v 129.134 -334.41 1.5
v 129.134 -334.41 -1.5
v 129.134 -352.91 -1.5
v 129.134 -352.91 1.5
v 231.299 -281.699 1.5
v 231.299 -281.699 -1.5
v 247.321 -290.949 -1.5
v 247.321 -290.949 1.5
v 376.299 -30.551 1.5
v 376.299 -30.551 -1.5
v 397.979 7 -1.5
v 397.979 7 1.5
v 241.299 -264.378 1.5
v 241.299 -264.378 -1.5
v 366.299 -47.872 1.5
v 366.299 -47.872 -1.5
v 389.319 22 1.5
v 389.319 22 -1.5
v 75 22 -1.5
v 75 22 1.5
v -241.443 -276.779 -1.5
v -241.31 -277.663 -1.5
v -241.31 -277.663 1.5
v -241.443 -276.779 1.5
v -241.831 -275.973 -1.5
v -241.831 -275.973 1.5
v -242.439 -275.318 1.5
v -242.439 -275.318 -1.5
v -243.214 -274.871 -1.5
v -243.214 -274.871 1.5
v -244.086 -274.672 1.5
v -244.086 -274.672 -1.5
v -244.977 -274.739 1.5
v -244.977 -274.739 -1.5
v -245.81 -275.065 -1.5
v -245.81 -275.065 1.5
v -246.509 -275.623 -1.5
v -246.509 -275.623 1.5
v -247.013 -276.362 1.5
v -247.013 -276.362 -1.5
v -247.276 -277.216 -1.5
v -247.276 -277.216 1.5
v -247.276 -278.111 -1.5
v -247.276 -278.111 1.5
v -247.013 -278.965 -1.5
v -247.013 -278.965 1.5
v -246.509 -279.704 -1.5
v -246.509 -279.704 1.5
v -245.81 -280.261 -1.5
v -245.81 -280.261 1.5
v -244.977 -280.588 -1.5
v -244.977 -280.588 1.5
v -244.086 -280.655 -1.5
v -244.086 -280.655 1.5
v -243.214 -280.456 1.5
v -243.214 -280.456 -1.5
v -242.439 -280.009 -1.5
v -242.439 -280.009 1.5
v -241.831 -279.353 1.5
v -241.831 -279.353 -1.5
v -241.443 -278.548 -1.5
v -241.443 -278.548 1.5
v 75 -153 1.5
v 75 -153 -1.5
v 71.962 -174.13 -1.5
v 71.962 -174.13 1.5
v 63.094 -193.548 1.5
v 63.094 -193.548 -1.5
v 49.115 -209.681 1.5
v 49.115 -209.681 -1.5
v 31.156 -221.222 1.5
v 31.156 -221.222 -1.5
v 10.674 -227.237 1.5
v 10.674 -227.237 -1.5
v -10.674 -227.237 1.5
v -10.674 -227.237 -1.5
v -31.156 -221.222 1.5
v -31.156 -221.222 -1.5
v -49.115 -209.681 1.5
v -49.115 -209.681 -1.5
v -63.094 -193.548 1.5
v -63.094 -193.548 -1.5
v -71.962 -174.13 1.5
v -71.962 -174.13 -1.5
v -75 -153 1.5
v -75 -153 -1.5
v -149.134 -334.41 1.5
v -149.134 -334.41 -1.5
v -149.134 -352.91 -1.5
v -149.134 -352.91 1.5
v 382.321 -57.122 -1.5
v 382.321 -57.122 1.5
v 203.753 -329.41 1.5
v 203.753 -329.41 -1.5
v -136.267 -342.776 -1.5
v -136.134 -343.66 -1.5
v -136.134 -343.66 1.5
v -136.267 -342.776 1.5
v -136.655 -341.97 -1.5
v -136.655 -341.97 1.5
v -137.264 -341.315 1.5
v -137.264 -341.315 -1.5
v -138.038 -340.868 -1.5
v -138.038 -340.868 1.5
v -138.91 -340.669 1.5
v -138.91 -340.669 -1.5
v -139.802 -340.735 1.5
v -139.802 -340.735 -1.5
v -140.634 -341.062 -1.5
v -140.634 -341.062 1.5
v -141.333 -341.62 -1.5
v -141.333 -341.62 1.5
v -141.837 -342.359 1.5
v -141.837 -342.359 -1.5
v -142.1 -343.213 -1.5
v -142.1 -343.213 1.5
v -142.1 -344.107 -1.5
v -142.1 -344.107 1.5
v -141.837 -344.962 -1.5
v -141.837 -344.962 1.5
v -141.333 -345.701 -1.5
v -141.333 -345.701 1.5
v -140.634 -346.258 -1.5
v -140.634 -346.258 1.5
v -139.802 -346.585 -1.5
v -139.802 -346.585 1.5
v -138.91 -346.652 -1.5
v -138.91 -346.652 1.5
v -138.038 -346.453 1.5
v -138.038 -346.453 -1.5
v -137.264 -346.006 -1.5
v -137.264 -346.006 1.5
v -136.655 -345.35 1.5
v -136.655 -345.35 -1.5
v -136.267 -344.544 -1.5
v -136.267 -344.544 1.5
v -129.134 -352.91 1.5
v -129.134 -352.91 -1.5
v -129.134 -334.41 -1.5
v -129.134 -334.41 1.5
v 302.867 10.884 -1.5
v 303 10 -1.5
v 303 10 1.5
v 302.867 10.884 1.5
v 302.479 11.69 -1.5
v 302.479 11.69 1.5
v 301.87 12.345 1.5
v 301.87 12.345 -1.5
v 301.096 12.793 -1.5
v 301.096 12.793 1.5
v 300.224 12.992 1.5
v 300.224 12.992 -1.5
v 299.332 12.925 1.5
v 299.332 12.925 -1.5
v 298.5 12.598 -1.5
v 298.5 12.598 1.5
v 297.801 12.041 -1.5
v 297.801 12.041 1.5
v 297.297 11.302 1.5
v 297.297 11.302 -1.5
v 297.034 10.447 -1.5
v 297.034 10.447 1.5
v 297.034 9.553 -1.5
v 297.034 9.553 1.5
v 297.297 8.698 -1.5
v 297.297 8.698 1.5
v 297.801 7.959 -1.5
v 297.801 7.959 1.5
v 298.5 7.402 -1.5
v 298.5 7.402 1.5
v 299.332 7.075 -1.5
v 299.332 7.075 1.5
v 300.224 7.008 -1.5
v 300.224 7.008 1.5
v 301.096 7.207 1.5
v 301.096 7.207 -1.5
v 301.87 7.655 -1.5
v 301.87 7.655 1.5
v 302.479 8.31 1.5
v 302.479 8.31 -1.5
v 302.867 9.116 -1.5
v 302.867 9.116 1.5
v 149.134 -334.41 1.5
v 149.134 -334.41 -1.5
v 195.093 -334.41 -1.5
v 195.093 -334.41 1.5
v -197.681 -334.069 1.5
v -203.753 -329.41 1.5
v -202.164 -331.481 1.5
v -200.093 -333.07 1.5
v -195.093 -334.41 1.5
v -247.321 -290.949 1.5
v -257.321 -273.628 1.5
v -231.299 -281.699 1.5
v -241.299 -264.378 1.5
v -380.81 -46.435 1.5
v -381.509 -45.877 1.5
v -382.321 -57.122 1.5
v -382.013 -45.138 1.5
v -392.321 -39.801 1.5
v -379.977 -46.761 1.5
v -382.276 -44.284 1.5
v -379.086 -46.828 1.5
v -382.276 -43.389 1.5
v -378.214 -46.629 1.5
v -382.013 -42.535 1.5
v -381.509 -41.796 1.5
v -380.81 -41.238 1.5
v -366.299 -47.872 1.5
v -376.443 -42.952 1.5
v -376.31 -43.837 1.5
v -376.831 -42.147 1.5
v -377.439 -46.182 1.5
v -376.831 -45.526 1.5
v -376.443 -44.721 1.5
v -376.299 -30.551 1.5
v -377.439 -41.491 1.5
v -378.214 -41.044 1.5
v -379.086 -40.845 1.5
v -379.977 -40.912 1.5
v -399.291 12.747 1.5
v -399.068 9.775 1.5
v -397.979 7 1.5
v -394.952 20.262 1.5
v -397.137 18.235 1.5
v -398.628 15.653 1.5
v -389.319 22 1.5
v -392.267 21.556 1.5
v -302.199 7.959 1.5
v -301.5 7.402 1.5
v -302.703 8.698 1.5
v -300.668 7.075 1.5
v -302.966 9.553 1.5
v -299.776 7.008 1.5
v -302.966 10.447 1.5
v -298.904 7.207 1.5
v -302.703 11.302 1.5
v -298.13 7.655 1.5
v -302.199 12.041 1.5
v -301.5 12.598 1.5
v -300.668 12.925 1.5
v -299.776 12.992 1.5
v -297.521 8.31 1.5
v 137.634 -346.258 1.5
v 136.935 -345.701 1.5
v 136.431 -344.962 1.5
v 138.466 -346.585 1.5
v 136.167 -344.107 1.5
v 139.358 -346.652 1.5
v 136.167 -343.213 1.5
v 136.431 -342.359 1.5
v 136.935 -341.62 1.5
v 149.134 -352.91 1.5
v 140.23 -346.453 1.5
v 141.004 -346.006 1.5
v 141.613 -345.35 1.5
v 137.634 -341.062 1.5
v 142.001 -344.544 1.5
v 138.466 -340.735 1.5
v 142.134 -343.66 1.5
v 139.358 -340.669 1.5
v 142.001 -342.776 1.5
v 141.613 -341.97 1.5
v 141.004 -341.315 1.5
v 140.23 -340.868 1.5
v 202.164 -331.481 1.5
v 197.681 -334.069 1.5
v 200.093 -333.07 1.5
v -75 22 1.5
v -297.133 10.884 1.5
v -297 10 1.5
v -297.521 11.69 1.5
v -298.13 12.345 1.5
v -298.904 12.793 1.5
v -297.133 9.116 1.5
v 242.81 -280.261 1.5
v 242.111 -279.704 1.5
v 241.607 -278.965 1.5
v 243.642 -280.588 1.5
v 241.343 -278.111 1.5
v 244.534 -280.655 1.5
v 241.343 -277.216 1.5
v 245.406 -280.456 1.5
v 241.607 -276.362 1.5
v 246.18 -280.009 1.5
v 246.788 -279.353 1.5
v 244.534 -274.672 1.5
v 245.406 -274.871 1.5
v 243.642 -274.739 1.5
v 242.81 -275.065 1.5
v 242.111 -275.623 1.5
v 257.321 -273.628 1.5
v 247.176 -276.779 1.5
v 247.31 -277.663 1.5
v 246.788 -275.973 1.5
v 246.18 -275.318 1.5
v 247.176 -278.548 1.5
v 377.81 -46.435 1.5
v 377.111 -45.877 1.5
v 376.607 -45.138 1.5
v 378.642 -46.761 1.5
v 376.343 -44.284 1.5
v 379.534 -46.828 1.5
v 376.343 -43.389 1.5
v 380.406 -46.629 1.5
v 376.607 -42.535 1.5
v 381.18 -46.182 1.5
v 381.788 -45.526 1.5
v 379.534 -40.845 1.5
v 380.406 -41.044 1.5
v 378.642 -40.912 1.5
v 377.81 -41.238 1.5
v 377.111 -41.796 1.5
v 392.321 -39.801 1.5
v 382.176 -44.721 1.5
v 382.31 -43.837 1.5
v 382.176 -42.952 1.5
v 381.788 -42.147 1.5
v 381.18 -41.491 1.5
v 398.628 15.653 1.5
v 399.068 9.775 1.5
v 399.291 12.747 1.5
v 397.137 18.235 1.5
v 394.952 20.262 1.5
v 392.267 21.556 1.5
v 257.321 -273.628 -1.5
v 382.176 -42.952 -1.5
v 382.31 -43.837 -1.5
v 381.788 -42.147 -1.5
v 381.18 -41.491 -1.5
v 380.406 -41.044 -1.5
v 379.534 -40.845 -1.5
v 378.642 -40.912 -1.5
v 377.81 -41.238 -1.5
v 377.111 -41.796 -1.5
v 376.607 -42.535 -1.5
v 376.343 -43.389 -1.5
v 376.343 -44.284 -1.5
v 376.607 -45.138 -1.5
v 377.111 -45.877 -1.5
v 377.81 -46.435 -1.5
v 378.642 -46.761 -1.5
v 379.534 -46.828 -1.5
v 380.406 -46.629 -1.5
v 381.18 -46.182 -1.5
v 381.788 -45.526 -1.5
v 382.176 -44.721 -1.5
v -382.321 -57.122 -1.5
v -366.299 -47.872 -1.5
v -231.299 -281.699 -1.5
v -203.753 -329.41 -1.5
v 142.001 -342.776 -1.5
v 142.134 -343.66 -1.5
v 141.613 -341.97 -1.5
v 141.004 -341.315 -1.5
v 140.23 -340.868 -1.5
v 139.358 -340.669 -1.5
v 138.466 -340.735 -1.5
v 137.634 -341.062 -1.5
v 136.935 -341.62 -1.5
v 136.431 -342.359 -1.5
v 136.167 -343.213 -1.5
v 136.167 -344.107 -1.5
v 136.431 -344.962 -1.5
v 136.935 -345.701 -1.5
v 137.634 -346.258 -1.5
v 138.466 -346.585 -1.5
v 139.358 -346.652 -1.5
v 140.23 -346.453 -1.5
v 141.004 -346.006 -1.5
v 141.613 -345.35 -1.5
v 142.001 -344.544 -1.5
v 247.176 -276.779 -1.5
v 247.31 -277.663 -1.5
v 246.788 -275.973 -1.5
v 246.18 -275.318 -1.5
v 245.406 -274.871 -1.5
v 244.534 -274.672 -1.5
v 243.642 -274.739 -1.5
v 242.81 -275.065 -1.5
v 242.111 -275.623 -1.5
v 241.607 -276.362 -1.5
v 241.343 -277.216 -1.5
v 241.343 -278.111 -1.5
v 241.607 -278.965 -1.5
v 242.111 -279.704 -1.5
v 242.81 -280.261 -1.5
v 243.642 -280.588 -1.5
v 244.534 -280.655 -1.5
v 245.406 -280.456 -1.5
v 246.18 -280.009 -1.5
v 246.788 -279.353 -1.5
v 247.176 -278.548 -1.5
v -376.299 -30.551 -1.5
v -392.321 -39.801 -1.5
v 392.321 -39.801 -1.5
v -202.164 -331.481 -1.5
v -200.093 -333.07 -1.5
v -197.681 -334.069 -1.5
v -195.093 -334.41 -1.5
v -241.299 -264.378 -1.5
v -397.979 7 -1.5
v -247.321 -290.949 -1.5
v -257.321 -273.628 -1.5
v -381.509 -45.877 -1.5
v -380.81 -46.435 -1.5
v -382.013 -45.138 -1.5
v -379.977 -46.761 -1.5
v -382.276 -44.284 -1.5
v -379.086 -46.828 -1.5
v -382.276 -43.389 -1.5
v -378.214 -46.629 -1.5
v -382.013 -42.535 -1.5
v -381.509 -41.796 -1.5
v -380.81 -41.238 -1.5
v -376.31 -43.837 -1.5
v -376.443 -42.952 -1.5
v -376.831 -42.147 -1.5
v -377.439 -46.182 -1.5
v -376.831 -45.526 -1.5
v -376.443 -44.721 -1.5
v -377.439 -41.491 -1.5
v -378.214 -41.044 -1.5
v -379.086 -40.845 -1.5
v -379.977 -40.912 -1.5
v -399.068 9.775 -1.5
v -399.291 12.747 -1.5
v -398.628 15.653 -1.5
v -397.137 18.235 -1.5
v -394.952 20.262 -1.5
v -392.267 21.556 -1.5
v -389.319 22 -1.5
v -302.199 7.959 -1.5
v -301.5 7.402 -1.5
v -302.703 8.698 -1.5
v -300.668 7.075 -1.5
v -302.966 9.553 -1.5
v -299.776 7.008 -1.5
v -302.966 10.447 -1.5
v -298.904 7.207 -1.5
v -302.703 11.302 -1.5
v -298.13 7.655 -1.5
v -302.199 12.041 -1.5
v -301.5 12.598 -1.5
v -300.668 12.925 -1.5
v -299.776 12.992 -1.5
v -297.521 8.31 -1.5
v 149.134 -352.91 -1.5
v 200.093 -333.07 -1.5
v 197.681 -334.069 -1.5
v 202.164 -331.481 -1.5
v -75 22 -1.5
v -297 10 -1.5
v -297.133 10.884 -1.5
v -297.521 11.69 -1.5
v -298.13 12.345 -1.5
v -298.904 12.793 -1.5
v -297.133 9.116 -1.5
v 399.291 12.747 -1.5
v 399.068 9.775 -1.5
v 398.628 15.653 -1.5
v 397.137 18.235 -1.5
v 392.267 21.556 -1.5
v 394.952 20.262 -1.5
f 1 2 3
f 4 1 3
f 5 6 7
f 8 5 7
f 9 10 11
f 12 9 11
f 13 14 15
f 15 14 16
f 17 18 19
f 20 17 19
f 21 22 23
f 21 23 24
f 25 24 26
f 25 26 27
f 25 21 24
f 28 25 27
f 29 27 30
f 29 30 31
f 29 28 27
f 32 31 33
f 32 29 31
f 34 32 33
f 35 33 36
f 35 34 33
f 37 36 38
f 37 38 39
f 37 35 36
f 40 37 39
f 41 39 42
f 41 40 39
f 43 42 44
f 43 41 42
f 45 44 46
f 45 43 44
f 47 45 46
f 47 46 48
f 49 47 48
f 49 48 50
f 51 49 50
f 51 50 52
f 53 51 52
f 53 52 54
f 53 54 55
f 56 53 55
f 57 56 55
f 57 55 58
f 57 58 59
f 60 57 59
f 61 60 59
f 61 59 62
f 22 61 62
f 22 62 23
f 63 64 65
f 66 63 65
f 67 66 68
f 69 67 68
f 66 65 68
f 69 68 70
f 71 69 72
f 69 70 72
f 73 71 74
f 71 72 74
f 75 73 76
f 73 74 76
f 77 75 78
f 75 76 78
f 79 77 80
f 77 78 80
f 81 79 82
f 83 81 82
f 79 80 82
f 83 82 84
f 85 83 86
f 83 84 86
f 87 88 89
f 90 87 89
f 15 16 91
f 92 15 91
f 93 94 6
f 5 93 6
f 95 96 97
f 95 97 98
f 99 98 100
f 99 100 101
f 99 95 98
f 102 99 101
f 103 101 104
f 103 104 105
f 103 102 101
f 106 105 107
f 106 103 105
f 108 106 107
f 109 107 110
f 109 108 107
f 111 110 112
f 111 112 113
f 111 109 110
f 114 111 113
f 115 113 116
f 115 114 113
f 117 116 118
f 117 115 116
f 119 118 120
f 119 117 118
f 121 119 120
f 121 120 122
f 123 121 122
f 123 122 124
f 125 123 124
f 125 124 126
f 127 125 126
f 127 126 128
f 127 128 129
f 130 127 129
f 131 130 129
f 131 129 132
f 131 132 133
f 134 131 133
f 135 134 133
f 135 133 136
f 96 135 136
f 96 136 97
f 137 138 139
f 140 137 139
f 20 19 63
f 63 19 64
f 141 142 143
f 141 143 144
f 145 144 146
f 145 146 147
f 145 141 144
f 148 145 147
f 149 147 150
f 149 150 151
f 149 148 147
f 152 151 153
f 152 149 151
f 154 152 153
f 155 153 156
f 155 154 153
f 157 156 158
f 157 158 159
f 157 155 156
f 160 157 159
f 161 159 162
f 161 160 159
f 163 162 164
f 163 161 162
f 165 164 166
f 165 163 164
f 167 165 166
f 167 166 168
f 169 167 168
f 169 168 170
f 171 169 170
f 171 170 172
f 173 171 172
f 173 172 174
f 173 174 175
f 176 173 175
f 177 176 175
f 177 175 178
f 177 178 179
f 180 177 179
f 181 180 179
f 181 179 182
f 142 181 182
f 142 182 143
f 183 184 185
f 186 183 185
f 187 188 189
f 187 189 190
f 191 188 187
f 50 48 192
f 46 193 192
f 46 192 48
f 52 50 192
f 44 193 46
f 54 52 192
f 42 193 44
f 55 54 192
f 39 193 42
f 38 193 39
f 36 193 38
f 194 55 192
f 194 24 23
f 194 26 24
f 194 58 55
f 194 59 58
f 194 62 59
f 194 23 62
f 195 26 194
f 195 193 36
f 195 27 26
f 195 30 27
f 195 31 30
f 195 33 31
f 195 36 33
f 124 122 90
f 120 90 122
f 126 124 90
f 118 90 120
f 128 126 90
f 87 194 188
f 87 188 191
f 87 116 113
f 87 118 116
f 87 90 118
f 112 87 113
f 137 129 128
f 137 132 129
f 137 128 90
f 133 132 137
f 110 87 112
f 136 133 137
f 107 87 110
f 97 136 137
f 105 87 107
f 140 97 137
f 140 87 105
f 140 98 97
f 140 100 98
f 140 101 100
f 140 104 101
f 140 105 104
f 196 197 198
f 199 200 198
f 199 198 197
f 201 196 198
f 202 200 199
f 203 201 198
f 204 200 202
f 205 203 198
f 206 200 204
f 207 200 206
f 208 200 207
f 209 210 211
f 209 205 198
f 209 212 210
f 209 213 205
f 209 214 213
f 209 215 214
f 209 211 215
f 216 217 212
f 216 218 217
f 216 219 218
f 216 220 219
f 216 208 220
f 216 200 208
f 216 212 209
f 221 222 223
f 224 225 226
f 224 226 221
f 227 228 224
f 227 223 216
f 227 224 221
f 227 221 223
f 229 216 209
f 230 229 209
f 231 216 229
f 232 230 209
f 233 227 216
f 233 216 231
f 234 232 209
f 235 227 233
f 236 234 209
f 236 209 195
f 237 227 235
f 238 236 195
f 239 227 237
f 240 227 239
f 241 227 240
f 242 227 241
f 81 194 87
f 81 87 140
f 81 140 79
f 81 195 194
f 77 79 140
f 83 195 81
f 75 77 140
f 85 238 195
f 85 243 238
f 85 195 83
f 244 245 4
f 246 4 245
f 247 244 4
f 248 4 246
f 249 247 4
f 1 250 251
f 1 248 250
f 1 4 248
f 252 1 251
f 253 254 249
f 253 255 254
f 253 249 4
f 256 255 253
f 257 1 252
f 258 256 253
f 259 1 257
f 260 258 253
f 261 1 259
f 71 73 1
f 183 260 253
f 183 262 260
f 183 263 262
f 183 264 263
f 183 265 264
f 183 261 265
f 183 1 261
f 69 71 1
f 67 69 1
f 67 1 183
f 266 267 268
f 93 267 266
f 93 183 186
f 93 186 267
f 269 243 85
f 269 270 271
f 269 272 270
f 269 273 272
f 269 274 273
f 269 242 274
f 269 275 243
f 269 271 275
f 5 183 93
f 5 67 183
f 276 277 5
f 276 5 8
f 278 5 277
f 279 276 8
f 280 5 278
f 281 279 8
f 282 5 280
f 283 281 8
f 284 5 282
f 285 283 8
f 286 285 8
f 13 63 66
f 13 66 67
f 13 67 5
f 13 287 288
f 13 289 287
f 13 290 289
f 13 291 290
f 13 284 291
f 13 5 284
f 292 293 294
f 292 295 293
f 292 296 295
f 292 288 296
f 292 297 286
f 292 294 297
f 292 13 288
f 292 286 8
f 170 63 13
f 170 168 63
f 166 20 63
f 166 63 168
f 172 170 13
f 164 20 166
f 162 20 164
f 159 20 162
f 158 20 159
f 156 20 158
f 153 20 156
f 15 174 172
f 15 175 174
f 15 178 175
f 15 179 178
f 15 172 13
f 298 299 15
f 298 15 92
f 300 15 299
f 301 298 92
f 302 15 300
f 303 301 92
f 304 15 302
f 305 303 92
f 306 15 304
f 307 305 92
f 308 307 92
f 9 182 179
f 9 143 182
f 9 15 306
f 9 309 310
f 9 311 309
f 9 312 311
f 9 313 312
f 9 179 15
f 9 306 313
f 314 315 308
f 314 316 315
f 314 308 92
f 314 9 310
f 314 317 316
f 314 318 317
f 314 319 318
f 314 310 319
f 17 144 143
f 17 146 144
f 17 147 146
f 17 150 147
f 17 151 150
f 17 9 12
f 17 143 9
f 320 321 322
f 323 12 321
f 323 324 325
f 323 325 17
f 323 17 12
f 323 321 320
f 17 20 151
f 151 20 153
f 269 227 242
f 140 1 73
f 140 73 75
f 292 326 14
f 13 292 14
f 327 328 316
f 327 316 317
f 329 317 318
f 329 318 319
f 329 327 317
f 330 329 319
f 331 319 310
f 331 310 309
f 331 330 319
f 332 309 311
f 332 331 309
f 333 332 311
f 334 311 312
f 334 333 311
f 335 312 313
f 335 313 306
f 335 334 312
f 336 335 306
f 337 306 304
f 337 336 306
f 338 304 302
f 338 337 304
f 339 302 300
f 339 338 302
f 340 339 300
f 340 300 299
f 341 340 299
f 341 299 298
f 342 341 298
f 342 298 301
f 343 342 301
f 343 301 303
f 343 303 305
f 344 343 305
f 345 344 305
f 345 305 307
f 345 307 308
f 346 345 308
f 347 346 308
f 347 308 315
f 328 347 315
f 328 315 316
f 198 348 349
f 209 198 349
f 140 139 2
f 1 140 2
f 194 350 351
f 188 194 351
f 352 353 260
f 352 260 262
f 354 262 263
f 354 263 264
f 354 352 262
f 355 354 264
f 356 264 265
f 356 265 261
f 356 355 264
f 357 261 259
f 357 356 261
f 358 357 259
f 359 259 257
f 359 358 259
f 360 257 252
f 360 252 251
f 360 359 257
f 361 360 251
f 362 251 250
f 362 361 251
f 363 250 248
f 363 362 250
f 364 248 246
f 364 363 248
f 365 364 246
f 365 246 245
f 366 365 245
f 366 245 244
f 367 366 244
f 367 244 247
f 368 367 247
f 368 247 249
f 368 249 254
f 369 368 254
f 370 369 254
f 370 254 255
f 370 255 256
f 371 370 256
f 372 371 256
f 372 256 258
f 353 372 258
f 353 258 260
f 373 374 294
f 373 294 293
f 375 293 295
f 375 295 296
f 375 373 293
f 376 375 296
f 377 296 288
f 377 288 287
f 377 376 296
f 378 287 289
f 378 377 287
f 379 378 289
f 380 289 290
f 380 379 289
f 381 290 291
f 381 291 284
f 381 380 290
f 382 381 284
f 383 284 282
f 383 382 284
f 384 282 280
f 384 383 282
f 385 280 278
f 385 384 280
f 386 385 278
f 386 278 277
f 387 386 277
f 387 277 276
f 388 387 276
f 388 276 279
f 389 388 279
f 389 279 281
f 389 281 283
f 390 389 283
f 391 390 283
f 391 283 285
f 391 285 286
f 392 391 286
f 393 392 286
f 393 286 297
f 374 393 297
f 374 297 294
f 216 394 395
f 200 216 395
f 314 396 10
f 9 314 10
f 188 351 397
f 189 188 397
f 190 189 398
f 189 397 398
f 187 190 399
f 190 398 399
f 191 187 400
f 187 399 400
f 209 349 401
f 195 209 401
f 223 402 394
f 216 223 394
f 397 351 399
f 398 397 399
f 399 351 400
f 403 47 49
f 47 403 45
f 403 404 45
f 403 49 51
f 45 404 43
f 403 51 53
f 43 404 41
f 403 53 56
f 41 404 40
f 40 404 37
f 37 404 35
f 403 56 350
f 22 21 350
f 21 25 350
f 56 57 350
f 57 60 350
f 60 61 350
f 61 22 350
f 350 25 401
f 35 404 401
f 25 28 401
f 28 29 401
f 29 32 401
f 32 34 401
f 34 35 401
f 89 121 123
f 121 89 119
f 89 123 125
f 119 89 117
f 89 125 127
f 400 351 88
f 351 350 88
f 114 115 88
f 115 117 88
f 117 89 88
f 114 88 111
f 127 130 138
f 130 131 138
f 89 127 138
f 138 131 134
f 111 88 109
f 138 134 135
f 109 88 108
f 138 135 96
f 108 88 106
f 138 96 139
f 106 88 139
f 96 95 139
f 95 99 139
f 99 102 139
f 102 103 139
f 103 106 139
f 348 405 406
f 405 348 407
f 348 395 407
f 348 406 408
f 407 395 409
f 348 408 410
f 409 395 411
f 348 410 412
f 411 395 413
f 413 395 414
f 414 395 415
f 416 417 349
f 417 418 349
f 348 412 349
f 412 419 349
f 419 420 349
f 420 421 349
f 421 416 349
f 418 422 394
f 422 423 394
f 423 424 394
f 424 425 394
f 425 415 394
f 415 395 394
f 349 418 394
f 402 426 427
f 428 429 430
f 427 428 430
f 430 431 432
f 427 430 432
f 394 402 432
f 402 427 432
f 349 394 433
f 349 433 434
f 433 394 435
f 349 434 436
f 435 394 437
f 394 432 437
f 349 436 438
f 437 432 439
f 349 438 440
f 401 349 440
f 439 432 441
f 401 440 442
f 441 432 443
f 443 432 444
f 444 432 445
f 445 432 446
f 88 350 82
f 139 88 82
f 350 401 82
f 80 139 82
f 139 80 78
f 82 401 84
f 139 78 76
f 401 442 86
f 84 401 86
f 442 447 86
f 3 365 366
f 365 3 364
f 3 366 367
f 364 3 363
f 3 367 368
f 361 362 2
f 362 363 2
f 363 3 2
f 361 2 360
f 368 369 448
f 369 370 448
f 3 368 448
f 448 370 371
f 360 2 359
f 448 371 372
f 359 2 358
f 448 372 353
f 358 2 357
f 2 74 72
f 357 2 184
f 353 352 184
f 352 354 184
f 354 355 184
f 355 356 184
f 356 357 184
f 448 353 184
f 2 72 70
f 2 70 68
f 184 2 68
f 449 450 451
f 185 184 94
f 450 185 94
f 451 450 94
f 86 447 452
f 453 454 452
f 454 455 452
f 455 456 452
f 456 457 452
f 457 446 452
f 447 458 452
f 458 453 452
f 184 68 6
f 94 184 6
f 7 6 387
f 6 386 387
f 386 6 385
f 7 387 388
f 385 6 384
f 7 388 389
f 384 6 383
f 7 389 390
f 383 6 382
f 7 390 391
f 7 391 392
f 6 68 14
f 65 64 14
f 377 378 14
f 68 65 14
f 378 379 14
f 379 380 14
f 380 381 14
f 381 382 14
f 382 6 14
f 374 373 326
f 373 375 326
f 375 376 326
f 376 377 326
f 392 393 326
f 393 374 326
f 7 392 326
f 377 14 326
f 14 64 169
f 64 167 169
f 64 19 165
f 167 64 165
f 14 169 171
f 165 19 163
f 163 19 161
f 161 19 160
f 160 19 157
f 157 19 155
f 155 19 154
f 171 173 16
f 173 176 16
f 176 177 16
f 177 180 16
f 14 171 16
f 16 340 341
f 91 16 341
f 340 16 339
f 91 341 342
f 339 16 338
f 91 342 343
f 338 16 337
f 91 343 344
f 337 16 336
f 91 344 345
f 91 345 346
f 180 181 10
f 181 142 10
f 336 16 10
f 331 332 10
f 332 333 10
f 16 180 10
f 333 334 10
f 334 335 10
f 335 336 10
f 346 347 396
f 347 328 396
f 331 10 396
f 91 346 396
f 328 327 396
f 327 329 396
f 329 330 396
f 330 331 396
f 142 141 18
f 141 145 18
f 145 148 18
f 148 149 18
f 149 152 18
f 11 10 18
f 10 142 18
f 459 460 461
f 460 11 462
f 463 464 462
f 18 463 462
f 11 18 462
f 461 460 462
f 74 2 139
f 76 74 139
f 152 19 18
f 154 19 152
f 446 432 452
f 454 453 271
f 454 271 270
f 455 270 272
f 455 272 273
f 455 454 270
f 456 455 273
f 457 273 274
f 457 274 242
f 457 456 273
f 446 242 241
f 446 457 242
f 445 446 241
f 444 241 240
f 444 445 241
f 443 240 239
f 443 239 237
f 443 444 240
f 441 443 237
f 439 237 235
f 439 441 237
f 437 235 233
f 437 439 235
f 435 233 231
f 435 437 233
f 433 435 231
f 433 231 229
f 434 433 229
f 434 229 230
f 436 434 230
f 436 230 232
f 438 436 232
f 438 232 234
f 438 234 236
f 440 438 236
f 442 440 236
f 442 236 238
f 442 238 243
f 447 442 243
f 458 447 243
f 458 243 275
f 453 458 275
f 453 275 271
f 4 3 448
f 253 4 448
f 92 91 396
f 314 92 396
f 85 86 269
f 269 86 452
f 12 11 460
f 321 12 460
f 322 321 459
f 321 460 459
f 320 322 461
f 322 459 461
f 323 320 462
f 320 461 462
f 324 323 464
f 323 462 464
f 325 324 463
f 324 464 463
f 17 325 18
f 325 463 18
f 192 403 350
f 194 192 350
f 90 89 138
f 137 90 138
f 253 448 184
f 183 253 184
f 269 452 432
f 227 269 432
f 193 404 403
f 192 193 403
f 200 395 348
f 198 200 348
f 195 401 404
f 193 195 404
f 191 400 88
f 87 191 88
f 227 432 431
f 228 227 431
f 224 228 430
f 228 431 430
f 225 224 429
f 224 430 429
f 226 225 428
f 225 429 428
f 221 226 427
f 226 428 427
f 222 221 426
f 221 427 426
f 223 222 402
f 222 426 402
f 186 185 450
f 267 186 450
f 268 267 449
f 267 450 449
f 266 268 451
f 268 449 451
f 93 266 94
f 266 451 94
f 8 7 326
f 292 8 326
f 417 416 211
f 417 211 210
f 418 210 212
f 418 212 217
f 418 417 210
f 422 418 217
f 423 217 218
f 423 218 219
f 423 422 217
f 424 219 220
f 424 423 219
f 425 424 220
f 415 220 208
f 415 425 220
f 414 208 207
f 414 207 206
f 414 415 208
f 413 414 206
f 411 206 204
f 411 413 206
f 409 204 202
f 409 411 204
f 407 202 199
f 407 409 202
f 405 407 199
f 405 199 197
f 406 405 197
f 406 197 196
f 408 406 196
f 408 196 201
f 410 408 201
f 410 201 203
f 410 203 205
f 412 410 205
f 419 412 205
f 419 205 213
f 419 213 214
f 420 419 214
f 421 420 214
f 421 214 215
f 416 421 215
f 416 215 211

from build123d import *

# Parameters (mm, degrees)
SKETCH_1_R              = 3
EXTRUDE_1_DEPTH         = 1.5
SHEET_START             = -1.5
SHEET_METAL_1_OUTLINE_R = 3
SHEET_METAL_1_DEPTH     = 1.5


# Read off the part's stored shape, not the designer's step: Преобразовать-Твердое тело1
with BuildPart() as part:
    # Sketch 1 → Бобышка-Вытянуть1 (new body)
    with BuildSketch(Plane.XY):
        with BuildLine():
            Line((389.31902002, 22), (75, 22))
            Line((75, 22), (75, -153))
            ThreePointArc((75, -153), (0, -228), (-75, -153))
            Line((-75, -153), (-75, 22))
            Line((-75, 22), (-389.31902002, 22))
            ThreePointArc((-389.31902002, 22), (-397.979274058, 17), (-397.979274058, 7))
            Line((-397.979274058, 7), (-376.299038106, -30.551270189))
            Line((-376.299038106, -30.551270189), (-392.320508076, -39.801270189))
            Line((-392.320508076, -39.801270189), (-382.320508076, -57.121778265))
            Line((-382.320508076, -57.121778265), (-366.299038106, -47.871778265))
            Line((-366.299038106, -47.871778265), (-241.299038106, -264.378129211))
            Line((-241.299038106, -264.378129211), (-257.320508076, -273.628129211))
            Line((-257.320508076, -273.628129211), (-247.320508076, -290.948637287))
            Line((-247.320508076, -290.948637287), (-231.299038106, -281.698637287))
            Line((-231.299038106, -281.698637287), (-203.75277675, -329.410161514))
            ThreePointArc((-203.75277675, -329.410161514), (-200.092522712, -333.070415552), (-195.092522712, -334.410161514))
            Line((-195.092522712, -334.410161514), (-149.133974596, -334.410161514))
            Line((-149.133974596, -334.410161514), (-149.133974596, -352.910161514))
            Line((-149.133974596, -352.910161514), (-129.133974596, -352.910161514))
            Line((-129.133974596, -352.910161514), (-129.133974596, -334.410161514))
            Line((-129.133974596, -334.410161514), (129.133974596, -334.410161514))
            Line((129.133974596, -334.410161514), (129.133974596, -352.910161514))
            Line((129.133974596, -352.910161514), (149.133974596, -352.910161514))
            Line((149.133974596, -352.910161514), (149.133974596, -334.410161514))
            Line((149.133974596, -334.410161514), (195.092522712, -334.410161514))
            ThreePointArc((195.092522712, -334.410161514), (200.092522712, -333.070415552), (203.75277675, -329.410161514))
            Line((203.75277675, -329.410161514), (231.299038106, -281.698637287))
            Line((231.299038106, -281.698637287), (247.320508076, -290.948637287))
            Line((247.320508076, -290.948637287), (257.320508076, -273.628129211))
            Line((257.320508076, -273.628129211), (241.299038106, -264.378129211))
            Line((241.299038106, -264.378129211), (366.299038106, -47.871778265))
            Line((366.299038106, -47.871778265), (382.320508076, -57.121778265))
            Line((382.320508076, -57.121778265), (392.320508076, -39.801270189))
            Line((392.320508076, -39.801270189), (376.299038106, -30.551270189))
            Line((376.299038106, -30.551270189), (397.979274058, 7))
            ThreePointArc((397.979274058, 7), (397.979274058, 17), (389.31902002, 22))
        make_face()
        with Locations((244.309773091, -277.663383249)):
            Circle(SKETCH_1_R, mode=Mode.SUBTRACT)
        with Locations((379.309773091, -43.836524227)):
            Circle(SKETCH_1_R, mode=Mode.SUBTRACT)
        with Locations((139.133974596, -343.660161514)):
            Circle(SKETCH_1_R, mode=Mode.SUBTRACT)
        with Locations((-139.133974596, -343.660161514)):
            Circle(SKETCH_1_R, mode=Mode.SUBTRACT)
        with Locations((-244.309773091, -277.663383249)):
            Circle(SKETCH_1_R, mode=Mode.SUBTRACT)
        with Locations((-379.309773091, -43.836524227)):
            Circle(SKETCH_1_R, mode=Mode.SUBTRACT)
        with Locations((300, 10)):
            Circle(SKETCH_1_R, mode=Mode.SUBTRACT)
        with Locations((-300, 10)):
            Circle(SKETCH_1_R, mode=Mode.SUBTRACT)
    extrude(amount=EXTRUDE_1_DEPTH)

    # Sheet Metal 1 outline → Sheet Metal 1 (add)
    with BuildSketch(Plane.XY.offset(SHEET_START)):
        with BuildLine():
            Line((-149.133974596, -334.410161514), (-149.133974596, -352.910161514))
            Line((-149.133974596, -352.910161514), (-129.133974596, -352.910161514))
            Line((-129.133974596, -352.910161514), (-129.133974596, -334.410161514))
            Line((-129.133974596, -334.410161514), (129.133974596, -334.410161514))
            Line((129.133974596, -334.410161514), (129.133974596, -352.910161514))
            Line((129.133974596, -352.910161514), (149.133974596, -352.910161514))
            Line((149.133974596, -352.910161514), (149.133974596, -334.410161514))
            Line((149.133974596, -334.410161514), (195.092522712, -334.410161514))
            ThreePointArc((195.092522712, -334.410161514), (200.092522712, -333.070415552), (203.75277675, -329.410161514))
            Line((203.75277675, -329.410161514), (231.299038106, -281.698637287))
            Line((231.299038106, -281.698637287), (247.320508076, -290.948637287))
            Line((247.320508076, -290.948637287), (257.320508076, -273.628129211))
            Line((257.320508076, -273.628129211), (241.299038106, -264.378129211))
            Line((241.299038106, -264.378129211), (366.299038106, -47.871778265))
            Line((366.299038106, -47.871778265), (382.320508076, -57.121778265))
            Line((382.320508076, -57.121778265), (392.320508076, -39.801270189))
            Line((392.320508076, -39.801270189), (376.299038106, -30.551270189))
            Line((376.299038106, -30.551270189), (397.979274058, 7))
            ThreePointArc((397.979274058, 7), (397.979274058, 17), (389.31902002, 22))
            Line((389.31902002, 22), (75, 22))
            Line((75, 22), (75, -153))
            ThreePointArc((75, -153), (0, -228), (-75, -153))
            Line((-75, -153), (-75, 22))
            Line((-75, 22), (-389.31902002, 22))
            ThreePointArc((-389.31902002, 22), (-397.979274058, 17), (-397.979274058, 7))
            Line((-397.979274058, 7), (-376.299038106, -30.551270189))
            Line((-376.299038106, -30.551270189), (-392.320508076, -39.801270189))
            Line((-392.320508076, -39.801270189), (-382.320508076, -57.121778265))
            Line((-382.320508076, -57.121778265), (-366.299038106, -47.871778265))
            Line((-366.299038106, -47.871778265), (-241.299038106, -264.378129211))
            Line((-241.299038106, -264.378129211), (-257.320508076, -273.628129211))
            Line((-257.320508076, -273.628129211), (-247.320508076, -290.948637287))
            Line((-247.320508076, -290.948637287), (-231.299038106, -281.698637287))
            Line((-231.299038106, -281.698637287), (-203.75277675, -329.410161514))
            ThreePointArc((-203.75277675, -329.410161514), (-200.092522712, -333.070415552), (-195.092522712, -334.410161514))
            Line((-195.092522712, -334.410161514), (-149.133974596, -334.410161514))
        make_face()
        with Locations((-244.309773091, -277.663383249)):
            Circle(SHEET_METAL_1_OUTLINE_R, mode=Mode.SUBTRACT)
        with Locations((-139.133974596, -343.660161514)):
            Circle(SHEET_METAL_1_OUTLINE_R, mode=Mode.SUBTRACT)
        with Locations((139.133974596, -343.660161514)):
            Circle(SHEET_METAL_1_OUTLINE_R, mode=Mode.SUBTRACT)
        with Locations((244.309773091, -277.663383249)):
            Circle(SHEET_METAL_1_OUTLINE_R, mode=Mode.SUBTRACT)
        with Locations((-379.309773091, -43.836524227)):
            Circle(SHEET_METAL_1_OUTLINE_R, mode=Mode.SUBTRACT)
        with Locations((-300, 10)):
            Circle(SHEET_METAL_1_OUTLINE_R, mode=Mode.SUBTRACT)
        with Locations((379.309773091, -43.836524227)):
            Circle(SHEET_METAL_1_OUTLINE_R, mode=Mode.SUBTRACT)
        with Locations((300, 10)):
            Circle(SHEET_METAL_1_OUTLINE_R, mode=Mode.SUBTRACT)
    extrude(amount=SHEET_METAL_1_DEPTH)


solid = part.part
